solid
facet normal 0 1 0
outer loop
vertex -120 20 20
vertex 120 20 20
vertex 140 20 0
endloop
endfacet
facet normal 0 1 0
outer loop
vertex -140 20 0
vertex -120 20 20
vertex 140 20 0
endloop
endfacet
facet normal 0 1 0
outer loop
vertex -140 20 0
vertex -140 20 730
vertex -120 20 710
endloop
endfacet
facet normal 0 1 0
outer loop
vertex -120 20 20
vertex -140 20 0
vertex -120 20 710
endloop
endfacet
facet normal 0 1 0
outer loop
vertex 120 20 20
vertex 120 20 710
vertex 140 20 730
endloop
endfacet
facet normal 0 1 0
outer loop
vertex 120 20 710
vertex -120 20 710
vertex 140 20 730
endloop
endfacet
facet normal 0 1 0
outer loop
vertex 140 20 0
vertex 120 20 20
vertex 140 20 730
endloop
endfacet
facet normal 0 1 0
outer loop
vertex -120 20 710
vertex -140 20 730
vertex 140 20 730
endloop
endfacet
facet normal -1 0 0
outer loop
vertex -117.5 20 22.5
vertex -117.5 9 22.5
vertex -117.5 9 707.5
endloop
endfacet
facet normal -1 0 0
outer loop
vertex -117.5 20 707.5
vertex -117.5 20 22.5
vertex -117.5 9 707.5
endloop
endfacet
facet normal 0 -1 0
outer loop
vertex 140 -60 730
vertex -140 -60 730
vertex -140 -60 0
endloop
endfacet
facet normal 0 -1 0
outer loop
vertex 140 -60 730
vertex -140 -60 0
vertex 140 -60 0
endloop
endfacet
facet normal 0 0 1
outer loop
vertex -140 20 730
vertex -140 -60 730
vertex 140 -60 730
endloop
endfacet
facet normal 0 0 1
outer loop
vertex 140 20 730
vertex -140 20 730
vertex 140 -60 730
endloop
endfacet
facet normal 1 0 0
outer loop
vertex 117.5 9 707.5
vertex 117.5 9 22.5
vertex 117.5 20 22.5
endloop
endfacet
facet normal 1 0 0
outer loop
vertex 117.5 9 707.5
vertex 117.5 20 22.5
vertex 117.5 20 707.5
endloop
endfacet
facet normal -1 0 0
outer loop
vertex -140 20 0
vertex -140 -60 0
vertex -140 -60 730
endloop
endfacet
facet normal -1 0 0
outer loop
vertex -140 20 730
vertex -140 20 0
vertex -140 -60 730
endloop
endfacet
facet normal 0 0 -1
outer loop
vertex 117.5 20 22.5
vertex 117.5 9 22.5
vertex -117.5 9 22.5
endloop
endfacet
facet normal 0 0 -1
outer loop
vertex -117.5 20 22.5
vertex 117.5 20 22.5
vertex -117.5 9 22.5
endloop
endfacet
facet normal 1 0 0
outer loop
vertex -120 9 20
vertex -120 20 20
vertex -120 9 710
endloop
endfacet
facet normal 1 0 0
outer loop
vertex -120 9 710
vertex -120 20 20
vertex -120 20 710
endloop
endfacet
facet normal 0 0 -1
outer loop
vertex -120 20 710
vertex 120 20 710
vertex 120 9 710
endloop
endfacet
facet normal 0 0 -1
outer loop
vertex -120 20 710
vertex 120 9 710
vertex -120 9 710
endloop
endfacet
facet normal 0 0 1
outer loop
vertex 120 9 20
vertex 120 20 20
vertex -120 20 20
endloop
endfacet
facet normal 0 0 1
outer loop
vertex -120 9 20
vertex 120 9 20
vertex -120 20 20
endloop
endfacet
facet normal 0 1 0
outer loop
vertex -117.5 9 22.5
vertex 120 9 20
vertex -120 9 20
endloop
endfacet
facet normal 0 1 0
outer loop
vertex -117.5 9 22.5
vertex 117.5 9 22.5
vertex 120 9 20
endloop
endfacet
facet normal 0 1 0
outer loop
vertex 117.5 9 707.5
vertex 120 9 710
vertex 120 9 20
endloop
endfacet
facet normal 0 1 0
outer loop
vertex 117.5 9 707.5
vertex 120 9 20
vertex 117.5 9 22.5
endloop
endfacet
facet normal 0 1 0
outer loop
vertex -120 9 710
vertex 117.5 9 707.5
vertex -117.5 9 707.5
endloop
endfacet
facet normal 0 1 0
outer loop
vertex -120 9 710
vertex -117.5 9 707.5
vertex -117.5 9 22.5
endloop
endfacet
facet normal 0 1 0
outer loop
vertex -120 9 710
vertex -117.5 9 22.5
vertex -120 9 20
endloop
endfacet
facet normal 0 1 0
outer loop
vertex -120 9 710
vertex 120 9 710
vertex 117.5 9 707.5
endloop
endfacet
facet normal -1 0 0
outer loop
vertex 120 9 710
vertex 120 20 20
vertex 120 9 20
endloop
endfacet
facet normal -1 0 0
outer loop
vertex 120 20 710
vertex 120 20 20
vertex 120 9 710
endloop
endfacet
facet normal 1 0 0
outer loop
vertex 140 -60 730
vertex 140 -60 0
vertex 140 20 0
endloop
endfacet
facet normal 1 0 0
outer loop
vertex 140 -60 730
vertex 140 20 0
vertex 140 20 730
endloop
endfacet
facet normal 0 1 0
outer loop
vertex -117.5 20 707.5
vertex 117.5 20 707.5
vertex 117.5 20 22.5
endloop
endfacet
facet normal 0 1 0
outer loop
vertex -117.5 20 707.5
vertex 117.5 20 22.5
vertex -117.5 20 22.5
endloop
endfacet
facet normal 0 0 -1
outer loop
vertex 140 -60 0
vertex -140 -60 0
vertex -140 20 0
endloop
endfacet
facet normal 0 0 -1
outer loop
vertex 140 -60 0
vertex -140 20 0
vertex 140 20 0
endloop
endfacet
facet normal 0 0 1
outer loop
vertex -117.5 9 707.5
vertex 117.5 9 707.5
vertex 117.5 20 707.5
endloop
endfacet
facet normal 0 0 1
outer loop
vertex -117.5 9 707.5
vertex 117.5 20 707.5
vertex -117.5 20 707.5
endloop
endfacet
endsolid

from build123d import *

# Parameters (mm, degrees)
SKETCH1_W           = 280
SKETCH1_H           = 730
BOSS_EXTRUDE1_DEPTH = 80
SKETCH2_W           = 240
SKETCH2_H           = 690
CUT_EXTRUDE1_DEPTH  = 11
SKETCH3_W           = 235
SKETCH3_H           = 685
BOSS_EXTRUDE2_DEPTH = 11


with BuildPart() as part:
    # Sketch1 → Boss-Extrude1 (new body)
    with BuildSketch(Plane.XZ.offset(60)):
        with Locations((0, 365)):
            Rectangle(SKETCH1_W, SKETCH1_H)
    extrude(amount=-BOSS_EXTRUDE1_DEPTH)

    # Sketch2 → Cut-Extrude1 (cut)
    with BuildSketch(Plane(origin=(0, 20, 0), x_dir=(-1, 0, 0), z_dir=(0, 1, 0))):
        with Locations((0, 365)):
            Rectangle(SKETCH2_W, SKETCH2_H)
    extrude(amount=-CUT_EXTRUDE1_DEPTH, mode=Mode.SUBTRACT)

    # Sketch3 → Boss-Extrude2 (add)
    with BuildSketch(Plane(origin=(0, 9, 0), x_dir=(-1, 0, 0), z_dir=(0, 1, 0))):
        with Locations((0, 365)):
            Rectangle(SKETCH3_W, SKETCH3_H)
    extrude(amount=BOSS_EXTRUDE2_DEPTH)


solid = part.part
